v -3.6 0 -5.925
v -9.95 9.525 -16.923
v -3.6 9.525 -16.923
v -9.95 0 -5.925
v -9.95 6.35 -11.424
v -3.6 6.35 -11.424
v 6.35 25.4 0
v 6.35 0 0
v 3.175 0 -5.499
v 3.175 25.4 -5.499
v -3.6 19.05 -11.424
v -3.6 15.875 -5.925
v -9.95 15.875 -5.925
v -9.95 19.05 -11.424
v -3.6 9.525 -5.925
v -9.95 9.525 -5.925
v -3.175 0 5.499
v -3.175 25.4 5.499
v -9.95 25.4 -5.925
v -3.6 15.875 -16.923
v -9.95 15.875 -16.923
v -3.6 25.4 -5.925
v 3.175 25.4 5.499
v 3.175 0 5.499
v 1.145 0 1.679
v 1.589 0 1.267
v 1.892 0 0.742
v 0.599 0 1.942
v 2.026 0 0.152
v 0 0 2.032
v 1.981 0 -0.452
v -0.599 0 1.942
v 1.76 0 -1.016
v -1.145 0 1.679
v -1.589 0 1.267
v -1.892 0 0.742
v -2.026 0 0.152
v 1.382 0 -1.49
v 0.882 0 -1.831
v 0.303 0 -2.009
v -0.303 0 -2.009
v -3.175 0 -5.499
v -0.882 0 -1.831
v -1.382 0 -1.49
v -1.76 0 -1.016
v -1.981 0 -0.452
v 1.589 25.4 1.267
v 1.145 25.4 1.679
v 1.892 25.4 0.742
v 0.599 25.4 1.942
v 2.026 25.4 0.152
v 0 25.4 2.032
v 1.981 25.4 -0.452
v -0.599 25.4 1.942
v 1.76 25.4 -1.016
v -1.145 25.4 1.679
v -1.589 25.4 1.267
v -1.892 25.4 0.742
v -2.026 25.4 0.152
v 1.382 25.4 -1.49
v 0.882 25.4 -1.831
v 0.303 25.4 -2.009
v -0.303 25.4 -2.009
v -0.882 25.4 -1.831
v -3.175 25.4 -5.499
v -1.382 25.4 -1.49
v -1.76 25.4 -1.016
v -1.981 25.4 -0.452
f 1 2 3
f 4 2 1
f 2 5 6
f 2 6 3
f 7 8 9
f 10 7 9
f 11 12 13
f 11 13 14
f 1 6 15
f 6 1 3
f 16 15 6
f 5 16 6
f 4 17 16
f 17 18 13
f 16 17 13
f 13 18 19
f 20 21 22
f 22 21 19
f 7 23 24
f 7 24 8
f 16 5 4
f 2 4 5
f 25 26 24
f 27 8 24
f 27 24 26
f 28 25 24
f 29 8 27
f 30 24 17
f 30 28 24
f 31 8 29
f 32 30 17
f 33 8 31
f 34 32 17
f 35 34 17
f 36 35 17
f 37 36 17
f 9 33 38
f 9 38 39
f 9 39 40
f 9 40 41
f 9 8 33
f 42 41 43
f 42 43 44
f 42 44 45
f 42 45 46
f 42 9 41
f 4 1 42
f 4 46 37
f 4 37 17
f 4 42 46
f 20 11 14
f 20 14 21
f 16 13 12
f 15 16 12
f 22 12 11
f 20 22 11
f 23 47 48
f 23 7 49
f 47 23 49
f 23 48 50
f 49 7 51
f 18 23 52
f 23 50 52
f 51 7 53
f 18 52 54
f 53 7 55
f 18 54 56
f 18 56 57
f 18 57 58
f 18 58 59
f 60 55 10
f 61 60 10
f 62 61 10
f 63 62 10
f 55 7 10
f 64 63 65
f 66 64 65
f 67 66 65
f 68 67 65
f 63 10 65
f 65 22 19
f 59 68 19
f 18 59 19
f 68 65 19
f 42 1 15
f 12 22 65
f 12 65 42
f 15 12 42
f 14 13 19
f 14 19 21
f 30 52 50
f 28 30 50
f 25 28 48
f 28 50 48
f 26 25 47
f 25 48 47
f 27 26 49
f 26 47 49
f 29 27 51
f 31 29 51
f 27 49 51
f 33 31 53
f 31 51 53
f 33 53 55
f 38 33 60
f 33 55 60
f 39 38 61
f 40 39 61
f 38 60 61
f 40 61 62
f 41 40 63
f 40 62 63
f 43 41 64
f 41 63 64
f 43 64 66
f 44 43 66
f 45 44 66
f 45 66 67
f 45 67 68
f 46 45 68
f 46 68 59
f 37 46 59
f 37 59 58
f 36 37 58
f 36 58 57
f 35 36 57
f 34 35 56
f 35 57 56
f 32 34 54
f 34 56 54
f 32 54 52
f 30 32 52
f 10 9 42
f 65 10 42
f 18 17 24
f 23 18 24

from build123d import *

# Parameters (mm, degrees)
BOSS_EXTRUDE1_DEPTH = 25.4
SKETCH3_R           = 2.032
CUT_EXTRUDE1_DEPTH  = 25.4
BOSS_EXTRUDE2_DEPTH = 25.4
BOSS_EXTRUDE4_DEPTH = 6.35


with BuildPart() as part:
    # Sketch1 → Boss-Extrude1 (new body)
    with BuildSketch(Plane(origin=(0, 0, 0), x_dir=(1, 0, 0), z_dir=(0, 1, 0))):
        Polygon((3.175, 5.499261314), (-3.175, 5.499261314), (-6.35, 0), (-3.175, -5.499261314), (3.175, -5.499261314), (6.35, 0), align=None)
    extrude(amount=BOSS_EXTRUDE1_DEPTH)

    # Sketch3 → Cut-Extrude1 (cut)
    with BuildSketch(Plane(origin=(0, 25.4, 0), x_dir=(1, 0, 0), z_dir=(0, 1, 0))):
        with Locations(Location((0, 0, 0), (0, 0, 270))):
            Circle(SKETCH3_R)
    extrude(amount=-CUT_EXTRUDE1_DEPTH, mode=Mode.SUBTRACT)

    # Sketch2 → Boss-Extrude2 (add)
    with BuildSketch(Plane(origin=(0, 25.4, 0), x_dir=(1, 0, 0), z_dir=(0, 1, 0))):
        Polygon((-3.175, -5.499261314), (-9.950369343, 5.924630657), (-3.600369343, 5.924630657), (-3.175, 5.499261314), (-6.35, 0), align=None)
    extrude(amount=-BOSS_EXTRUDE2_DEPTH)

    # Sketch5 → Boss-Extrude4 (add)
    with BuildSketch(Plane.ZY.offset(9.950369343)):
        Polygon((-5.924630657, 15.875), (-11.423891971, 19.05), (-16.923153285, 15.875), (-5.924630657, 25.4), align=None)
        Polygon((-16.923153285, 9.525), (-5.924630657, 0), (-5.924630657, 9.525), (-11.423891971, 6.35), align=None)
    extrude(amount=-BOSS_EXTRUDE4_DEPTH)


solid = part.part
